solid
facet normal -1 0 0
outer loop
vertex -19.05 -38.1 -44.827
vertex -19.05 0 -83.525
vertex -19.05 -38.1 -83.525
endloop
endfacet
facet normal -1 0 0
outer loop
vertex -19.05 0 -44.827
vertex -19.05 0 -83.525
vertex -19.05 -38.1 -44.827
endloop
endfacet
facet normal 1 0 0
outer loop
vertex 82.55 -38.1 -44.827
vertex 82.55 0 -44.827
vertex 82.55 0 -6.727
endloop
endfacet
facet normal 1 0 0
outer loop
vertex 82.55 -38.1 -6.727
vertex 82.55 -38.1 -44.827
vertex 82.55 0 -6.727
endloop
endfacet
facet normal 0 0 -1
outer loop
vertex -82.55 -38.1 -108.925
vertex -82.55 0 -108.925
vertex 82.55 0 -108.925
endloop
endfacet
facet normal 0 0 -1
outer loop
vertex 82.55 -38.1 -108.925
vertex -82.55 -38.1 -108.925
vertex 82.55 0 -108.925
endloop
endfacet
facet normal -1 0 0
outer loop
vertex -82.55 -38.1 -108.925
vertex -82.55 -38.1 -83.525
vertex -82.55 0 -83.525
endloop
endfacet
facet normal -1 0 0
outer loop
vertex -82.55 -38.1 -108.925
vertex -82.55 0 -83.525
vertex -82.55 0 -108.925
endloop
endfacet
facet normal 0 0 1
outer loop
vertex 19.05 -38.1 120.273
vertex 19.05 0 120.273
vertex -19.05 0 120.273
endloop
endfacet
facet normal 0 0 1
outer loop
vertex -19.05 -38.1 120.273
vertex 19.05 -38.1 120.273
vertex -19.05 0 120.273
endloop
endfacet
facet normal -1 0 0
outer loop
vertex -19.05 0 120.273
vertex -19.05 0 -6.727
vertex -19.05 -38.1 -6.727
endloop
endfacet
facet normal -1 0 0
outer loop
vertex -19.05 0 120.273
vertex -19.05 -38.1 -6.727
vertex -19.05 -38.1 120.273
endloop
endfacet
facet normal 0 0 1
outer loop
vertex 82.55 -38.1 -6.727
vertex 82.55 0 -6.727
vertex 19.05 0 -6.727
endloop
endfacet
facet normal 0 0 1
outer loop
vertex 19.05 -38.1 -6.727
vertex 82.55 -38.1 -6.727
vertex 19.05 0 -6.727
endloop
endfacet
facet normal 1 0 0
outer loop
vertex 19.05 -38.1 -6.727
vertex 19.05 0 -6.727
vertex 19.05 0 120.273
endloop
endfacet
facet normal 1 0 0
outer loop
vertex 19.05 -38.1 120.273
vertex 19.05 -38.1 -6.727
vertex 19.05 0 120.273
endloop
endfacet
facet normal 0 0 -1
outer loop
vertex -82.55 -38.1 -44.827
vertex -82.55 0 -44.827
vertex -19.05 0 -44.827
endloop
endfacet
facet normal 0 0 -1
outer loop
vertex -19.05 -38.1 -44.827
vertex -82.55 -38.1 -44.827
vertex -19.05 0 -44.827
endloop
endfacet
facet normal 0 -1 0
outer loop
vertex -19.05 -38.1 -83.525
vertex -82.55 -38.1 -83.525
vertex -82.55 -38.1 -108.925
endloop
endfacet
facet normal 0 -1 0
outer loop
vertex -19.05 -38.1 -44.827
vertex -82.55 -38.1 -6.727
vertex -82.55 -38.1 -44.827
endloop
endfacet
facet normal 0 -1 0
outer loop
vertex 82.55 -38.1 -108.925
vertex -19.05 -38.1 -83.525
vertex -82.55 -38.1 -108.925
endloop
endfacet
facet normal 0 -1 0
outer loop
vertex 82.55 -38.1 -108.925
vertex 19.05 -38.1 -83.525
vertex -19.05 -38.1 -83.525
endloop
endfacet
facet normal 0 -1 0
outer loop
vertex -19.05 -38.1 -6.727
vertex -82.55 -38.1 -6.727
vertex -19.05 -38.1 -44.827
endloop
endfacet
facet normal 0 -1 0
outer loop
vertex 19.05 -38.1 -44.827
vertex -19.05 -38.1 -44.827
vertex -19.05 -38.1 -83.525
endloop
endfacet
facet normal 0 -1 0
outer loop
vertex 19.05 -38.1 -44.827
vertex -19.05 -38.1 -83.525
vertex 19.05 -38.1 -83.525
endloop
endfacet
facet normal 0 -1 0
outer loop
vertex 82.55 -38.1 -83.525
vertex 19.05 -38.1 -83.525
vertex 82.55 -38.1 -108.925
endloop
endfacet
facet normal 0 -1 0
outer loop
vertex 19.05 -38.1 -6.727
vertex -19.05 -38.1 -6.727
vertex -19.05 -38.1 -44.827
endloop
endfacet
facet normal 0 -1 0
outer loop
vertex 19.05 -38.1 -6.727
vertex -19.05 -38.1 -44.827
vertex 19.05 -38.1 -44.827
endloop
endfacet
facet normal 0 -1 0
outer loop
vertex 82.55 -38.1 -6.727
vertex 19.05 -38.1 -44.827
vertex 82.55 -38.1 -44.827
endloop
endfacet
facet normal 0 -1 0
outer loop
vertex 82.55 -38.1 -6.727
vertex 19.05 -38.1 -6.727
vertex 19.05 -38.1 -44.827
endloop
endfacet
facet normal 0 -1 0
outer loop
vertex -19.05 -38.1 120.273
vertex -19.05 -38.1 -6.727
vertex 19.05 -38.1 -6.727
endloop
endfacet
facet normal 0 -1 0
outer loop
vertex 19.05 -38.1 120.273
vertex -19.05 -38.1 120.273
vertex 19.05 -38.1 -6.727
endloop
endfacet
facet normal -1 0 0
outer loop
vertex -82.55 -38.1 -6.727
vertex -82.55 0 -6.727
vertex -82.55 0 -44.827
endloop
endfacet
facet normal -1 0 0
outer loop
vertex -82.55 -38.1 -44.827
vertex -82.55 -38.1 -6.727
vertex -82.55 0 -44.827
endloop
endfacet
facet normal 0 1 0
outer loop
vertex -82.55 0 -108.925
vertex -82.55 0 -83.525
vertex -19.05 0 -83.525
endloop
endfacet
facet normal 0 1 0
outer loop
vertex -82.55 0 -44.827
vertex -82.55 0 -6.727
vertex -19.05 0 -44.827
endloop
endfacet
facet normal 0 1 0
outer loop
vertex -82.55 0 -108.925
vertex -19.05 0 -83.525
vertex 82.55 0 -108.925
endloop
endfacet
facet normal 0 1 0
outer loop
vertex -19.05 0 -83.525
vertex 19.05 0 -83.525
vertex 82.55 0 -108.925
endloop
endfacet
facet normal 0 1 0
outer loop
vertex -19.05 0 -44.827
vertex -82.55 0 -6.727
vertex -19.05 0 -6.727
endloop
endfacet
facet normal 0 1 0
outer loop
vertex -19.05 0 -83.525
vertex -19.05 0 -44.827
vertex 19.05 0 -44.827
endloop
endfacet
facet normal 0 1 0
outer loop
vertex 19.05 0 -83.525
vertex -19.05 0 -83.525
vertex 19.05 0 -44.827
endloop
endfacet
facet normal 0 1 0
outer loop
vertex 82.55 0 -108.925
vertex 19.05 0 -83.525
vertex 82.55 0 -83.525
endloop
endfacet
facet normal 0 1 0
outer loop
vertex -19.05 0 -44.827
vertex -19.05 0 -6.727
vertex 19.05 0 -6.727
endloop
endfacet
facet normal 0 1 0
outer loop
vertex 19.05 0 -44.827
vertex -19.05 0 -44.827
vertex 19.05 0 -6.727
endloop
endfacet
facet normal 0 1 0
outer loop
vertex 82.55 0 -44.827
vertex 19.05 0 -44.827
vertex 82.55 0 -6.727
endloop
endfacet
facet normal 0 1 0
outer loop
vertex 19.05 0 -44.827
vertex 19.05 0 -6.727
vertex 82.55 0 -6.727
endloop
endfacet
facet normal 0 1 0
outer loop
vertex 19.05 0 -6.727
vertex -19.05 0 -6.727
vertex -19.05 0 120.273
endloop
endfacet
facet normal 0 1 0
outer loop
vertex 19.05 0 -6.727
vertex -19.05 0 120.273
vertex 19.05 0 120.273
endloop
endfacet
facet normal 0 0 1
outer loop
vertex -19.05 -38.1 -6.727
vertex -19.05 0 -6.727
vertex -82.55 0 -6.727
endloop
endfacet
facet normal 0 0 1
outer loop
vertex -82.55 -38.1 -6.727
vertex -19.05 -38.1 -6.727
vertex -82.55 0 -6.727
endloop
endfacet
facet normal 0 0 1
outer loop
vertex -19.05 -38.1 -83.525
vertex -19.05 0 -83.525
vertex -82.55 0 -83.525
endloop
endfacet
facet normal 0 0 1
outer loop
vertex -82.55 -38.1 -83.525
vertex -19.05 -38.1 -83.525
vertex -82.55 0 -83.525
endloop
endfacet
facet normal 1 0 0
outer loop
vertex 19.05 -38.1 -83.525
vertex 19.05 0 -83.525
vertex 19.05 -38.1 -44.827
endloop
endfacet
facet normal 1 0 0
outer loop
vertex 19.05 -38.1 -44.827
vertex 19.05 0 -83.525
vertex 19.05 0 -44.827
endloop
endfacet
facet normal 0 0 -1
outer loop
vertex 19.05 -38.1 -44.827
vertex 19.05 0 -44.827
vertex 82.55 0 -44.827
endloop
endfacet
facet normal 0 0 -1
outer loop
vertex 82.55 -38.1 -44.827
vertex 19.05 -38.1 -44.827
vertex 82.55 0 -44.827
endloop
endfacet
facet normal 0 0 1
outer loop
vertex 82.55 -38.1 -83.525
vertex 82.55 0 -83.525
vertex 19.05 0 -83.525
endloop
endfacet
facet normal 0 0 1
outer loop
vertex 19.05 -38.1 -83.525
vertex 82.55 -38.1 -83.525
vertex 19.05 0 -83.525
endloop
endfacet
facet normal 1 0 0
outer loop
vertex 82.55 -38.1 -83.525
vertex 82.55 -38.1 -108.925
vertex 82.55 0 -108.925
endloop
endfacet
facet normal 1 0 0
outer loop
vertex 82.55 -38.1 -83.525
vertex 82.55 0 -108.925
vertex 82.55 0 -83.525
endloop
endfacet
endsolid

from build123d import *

# Parameters (mm, degrees)
F0_W     = 19.05
F0_H     = 38.6983451158
F0_H_2   = 127
F0_H_3   = 1.5088043451
F1_DEPTH = 38.1


with BuildPart() as f1:
    # F0 (on Front) → F1 (new body)
    with BuildSketch(Plane.XZ):
        Polygon((82.55, -83.5251413941), (19.05, -83.5251413941), (19.05, -85.0339457393), (0, -85.0339457393), (0, -108.9251413941), (82.55, -108.9251413941), align=None)
        Polygon((0, -44.8267962784), (0, -6.7267962784), (-19.05, -6.7267962784), (-82.55, -6.7267962784), (-82.55, -44.8267962784), (-19.05, -44.8267962784), align=None)
        Polygon((19.05, -6.7267962784), (0, -6.7267962784), (0, -44.8267962784), (19.05, -44.8267962784), (82.55, -44.8267962784), (82.55, -6.7267962784), align=None)
        with Locations((9.525, -64.1759688362)):
            Rectangle(F0_W, F0_H)
        with Locations((-9.525, -64.1759688362)):
            Rectangle(F0_W, F0_H)
        with Locations((9.525, 56.7732037216)):
            Rectangle(F0_W, F0_H_2)
        Polygon((0, -85.0339457393), (0, -83.5251413941), (-19.05, -83.5251413941), (-82.55, -83.5251413941), (-82.55, -108.9251413941), (0, -108.9251413941), align=None)
        with Locations((-9.525, 56.7732037216)):
            Rectangle(F0_W, F0_H_2)
        with Locations((9.525, -84.2795435667)):
            Rectangle(F0_W, F0_H_3)
    extrude(amount=F1_DEPTH)


solid = f1.part
